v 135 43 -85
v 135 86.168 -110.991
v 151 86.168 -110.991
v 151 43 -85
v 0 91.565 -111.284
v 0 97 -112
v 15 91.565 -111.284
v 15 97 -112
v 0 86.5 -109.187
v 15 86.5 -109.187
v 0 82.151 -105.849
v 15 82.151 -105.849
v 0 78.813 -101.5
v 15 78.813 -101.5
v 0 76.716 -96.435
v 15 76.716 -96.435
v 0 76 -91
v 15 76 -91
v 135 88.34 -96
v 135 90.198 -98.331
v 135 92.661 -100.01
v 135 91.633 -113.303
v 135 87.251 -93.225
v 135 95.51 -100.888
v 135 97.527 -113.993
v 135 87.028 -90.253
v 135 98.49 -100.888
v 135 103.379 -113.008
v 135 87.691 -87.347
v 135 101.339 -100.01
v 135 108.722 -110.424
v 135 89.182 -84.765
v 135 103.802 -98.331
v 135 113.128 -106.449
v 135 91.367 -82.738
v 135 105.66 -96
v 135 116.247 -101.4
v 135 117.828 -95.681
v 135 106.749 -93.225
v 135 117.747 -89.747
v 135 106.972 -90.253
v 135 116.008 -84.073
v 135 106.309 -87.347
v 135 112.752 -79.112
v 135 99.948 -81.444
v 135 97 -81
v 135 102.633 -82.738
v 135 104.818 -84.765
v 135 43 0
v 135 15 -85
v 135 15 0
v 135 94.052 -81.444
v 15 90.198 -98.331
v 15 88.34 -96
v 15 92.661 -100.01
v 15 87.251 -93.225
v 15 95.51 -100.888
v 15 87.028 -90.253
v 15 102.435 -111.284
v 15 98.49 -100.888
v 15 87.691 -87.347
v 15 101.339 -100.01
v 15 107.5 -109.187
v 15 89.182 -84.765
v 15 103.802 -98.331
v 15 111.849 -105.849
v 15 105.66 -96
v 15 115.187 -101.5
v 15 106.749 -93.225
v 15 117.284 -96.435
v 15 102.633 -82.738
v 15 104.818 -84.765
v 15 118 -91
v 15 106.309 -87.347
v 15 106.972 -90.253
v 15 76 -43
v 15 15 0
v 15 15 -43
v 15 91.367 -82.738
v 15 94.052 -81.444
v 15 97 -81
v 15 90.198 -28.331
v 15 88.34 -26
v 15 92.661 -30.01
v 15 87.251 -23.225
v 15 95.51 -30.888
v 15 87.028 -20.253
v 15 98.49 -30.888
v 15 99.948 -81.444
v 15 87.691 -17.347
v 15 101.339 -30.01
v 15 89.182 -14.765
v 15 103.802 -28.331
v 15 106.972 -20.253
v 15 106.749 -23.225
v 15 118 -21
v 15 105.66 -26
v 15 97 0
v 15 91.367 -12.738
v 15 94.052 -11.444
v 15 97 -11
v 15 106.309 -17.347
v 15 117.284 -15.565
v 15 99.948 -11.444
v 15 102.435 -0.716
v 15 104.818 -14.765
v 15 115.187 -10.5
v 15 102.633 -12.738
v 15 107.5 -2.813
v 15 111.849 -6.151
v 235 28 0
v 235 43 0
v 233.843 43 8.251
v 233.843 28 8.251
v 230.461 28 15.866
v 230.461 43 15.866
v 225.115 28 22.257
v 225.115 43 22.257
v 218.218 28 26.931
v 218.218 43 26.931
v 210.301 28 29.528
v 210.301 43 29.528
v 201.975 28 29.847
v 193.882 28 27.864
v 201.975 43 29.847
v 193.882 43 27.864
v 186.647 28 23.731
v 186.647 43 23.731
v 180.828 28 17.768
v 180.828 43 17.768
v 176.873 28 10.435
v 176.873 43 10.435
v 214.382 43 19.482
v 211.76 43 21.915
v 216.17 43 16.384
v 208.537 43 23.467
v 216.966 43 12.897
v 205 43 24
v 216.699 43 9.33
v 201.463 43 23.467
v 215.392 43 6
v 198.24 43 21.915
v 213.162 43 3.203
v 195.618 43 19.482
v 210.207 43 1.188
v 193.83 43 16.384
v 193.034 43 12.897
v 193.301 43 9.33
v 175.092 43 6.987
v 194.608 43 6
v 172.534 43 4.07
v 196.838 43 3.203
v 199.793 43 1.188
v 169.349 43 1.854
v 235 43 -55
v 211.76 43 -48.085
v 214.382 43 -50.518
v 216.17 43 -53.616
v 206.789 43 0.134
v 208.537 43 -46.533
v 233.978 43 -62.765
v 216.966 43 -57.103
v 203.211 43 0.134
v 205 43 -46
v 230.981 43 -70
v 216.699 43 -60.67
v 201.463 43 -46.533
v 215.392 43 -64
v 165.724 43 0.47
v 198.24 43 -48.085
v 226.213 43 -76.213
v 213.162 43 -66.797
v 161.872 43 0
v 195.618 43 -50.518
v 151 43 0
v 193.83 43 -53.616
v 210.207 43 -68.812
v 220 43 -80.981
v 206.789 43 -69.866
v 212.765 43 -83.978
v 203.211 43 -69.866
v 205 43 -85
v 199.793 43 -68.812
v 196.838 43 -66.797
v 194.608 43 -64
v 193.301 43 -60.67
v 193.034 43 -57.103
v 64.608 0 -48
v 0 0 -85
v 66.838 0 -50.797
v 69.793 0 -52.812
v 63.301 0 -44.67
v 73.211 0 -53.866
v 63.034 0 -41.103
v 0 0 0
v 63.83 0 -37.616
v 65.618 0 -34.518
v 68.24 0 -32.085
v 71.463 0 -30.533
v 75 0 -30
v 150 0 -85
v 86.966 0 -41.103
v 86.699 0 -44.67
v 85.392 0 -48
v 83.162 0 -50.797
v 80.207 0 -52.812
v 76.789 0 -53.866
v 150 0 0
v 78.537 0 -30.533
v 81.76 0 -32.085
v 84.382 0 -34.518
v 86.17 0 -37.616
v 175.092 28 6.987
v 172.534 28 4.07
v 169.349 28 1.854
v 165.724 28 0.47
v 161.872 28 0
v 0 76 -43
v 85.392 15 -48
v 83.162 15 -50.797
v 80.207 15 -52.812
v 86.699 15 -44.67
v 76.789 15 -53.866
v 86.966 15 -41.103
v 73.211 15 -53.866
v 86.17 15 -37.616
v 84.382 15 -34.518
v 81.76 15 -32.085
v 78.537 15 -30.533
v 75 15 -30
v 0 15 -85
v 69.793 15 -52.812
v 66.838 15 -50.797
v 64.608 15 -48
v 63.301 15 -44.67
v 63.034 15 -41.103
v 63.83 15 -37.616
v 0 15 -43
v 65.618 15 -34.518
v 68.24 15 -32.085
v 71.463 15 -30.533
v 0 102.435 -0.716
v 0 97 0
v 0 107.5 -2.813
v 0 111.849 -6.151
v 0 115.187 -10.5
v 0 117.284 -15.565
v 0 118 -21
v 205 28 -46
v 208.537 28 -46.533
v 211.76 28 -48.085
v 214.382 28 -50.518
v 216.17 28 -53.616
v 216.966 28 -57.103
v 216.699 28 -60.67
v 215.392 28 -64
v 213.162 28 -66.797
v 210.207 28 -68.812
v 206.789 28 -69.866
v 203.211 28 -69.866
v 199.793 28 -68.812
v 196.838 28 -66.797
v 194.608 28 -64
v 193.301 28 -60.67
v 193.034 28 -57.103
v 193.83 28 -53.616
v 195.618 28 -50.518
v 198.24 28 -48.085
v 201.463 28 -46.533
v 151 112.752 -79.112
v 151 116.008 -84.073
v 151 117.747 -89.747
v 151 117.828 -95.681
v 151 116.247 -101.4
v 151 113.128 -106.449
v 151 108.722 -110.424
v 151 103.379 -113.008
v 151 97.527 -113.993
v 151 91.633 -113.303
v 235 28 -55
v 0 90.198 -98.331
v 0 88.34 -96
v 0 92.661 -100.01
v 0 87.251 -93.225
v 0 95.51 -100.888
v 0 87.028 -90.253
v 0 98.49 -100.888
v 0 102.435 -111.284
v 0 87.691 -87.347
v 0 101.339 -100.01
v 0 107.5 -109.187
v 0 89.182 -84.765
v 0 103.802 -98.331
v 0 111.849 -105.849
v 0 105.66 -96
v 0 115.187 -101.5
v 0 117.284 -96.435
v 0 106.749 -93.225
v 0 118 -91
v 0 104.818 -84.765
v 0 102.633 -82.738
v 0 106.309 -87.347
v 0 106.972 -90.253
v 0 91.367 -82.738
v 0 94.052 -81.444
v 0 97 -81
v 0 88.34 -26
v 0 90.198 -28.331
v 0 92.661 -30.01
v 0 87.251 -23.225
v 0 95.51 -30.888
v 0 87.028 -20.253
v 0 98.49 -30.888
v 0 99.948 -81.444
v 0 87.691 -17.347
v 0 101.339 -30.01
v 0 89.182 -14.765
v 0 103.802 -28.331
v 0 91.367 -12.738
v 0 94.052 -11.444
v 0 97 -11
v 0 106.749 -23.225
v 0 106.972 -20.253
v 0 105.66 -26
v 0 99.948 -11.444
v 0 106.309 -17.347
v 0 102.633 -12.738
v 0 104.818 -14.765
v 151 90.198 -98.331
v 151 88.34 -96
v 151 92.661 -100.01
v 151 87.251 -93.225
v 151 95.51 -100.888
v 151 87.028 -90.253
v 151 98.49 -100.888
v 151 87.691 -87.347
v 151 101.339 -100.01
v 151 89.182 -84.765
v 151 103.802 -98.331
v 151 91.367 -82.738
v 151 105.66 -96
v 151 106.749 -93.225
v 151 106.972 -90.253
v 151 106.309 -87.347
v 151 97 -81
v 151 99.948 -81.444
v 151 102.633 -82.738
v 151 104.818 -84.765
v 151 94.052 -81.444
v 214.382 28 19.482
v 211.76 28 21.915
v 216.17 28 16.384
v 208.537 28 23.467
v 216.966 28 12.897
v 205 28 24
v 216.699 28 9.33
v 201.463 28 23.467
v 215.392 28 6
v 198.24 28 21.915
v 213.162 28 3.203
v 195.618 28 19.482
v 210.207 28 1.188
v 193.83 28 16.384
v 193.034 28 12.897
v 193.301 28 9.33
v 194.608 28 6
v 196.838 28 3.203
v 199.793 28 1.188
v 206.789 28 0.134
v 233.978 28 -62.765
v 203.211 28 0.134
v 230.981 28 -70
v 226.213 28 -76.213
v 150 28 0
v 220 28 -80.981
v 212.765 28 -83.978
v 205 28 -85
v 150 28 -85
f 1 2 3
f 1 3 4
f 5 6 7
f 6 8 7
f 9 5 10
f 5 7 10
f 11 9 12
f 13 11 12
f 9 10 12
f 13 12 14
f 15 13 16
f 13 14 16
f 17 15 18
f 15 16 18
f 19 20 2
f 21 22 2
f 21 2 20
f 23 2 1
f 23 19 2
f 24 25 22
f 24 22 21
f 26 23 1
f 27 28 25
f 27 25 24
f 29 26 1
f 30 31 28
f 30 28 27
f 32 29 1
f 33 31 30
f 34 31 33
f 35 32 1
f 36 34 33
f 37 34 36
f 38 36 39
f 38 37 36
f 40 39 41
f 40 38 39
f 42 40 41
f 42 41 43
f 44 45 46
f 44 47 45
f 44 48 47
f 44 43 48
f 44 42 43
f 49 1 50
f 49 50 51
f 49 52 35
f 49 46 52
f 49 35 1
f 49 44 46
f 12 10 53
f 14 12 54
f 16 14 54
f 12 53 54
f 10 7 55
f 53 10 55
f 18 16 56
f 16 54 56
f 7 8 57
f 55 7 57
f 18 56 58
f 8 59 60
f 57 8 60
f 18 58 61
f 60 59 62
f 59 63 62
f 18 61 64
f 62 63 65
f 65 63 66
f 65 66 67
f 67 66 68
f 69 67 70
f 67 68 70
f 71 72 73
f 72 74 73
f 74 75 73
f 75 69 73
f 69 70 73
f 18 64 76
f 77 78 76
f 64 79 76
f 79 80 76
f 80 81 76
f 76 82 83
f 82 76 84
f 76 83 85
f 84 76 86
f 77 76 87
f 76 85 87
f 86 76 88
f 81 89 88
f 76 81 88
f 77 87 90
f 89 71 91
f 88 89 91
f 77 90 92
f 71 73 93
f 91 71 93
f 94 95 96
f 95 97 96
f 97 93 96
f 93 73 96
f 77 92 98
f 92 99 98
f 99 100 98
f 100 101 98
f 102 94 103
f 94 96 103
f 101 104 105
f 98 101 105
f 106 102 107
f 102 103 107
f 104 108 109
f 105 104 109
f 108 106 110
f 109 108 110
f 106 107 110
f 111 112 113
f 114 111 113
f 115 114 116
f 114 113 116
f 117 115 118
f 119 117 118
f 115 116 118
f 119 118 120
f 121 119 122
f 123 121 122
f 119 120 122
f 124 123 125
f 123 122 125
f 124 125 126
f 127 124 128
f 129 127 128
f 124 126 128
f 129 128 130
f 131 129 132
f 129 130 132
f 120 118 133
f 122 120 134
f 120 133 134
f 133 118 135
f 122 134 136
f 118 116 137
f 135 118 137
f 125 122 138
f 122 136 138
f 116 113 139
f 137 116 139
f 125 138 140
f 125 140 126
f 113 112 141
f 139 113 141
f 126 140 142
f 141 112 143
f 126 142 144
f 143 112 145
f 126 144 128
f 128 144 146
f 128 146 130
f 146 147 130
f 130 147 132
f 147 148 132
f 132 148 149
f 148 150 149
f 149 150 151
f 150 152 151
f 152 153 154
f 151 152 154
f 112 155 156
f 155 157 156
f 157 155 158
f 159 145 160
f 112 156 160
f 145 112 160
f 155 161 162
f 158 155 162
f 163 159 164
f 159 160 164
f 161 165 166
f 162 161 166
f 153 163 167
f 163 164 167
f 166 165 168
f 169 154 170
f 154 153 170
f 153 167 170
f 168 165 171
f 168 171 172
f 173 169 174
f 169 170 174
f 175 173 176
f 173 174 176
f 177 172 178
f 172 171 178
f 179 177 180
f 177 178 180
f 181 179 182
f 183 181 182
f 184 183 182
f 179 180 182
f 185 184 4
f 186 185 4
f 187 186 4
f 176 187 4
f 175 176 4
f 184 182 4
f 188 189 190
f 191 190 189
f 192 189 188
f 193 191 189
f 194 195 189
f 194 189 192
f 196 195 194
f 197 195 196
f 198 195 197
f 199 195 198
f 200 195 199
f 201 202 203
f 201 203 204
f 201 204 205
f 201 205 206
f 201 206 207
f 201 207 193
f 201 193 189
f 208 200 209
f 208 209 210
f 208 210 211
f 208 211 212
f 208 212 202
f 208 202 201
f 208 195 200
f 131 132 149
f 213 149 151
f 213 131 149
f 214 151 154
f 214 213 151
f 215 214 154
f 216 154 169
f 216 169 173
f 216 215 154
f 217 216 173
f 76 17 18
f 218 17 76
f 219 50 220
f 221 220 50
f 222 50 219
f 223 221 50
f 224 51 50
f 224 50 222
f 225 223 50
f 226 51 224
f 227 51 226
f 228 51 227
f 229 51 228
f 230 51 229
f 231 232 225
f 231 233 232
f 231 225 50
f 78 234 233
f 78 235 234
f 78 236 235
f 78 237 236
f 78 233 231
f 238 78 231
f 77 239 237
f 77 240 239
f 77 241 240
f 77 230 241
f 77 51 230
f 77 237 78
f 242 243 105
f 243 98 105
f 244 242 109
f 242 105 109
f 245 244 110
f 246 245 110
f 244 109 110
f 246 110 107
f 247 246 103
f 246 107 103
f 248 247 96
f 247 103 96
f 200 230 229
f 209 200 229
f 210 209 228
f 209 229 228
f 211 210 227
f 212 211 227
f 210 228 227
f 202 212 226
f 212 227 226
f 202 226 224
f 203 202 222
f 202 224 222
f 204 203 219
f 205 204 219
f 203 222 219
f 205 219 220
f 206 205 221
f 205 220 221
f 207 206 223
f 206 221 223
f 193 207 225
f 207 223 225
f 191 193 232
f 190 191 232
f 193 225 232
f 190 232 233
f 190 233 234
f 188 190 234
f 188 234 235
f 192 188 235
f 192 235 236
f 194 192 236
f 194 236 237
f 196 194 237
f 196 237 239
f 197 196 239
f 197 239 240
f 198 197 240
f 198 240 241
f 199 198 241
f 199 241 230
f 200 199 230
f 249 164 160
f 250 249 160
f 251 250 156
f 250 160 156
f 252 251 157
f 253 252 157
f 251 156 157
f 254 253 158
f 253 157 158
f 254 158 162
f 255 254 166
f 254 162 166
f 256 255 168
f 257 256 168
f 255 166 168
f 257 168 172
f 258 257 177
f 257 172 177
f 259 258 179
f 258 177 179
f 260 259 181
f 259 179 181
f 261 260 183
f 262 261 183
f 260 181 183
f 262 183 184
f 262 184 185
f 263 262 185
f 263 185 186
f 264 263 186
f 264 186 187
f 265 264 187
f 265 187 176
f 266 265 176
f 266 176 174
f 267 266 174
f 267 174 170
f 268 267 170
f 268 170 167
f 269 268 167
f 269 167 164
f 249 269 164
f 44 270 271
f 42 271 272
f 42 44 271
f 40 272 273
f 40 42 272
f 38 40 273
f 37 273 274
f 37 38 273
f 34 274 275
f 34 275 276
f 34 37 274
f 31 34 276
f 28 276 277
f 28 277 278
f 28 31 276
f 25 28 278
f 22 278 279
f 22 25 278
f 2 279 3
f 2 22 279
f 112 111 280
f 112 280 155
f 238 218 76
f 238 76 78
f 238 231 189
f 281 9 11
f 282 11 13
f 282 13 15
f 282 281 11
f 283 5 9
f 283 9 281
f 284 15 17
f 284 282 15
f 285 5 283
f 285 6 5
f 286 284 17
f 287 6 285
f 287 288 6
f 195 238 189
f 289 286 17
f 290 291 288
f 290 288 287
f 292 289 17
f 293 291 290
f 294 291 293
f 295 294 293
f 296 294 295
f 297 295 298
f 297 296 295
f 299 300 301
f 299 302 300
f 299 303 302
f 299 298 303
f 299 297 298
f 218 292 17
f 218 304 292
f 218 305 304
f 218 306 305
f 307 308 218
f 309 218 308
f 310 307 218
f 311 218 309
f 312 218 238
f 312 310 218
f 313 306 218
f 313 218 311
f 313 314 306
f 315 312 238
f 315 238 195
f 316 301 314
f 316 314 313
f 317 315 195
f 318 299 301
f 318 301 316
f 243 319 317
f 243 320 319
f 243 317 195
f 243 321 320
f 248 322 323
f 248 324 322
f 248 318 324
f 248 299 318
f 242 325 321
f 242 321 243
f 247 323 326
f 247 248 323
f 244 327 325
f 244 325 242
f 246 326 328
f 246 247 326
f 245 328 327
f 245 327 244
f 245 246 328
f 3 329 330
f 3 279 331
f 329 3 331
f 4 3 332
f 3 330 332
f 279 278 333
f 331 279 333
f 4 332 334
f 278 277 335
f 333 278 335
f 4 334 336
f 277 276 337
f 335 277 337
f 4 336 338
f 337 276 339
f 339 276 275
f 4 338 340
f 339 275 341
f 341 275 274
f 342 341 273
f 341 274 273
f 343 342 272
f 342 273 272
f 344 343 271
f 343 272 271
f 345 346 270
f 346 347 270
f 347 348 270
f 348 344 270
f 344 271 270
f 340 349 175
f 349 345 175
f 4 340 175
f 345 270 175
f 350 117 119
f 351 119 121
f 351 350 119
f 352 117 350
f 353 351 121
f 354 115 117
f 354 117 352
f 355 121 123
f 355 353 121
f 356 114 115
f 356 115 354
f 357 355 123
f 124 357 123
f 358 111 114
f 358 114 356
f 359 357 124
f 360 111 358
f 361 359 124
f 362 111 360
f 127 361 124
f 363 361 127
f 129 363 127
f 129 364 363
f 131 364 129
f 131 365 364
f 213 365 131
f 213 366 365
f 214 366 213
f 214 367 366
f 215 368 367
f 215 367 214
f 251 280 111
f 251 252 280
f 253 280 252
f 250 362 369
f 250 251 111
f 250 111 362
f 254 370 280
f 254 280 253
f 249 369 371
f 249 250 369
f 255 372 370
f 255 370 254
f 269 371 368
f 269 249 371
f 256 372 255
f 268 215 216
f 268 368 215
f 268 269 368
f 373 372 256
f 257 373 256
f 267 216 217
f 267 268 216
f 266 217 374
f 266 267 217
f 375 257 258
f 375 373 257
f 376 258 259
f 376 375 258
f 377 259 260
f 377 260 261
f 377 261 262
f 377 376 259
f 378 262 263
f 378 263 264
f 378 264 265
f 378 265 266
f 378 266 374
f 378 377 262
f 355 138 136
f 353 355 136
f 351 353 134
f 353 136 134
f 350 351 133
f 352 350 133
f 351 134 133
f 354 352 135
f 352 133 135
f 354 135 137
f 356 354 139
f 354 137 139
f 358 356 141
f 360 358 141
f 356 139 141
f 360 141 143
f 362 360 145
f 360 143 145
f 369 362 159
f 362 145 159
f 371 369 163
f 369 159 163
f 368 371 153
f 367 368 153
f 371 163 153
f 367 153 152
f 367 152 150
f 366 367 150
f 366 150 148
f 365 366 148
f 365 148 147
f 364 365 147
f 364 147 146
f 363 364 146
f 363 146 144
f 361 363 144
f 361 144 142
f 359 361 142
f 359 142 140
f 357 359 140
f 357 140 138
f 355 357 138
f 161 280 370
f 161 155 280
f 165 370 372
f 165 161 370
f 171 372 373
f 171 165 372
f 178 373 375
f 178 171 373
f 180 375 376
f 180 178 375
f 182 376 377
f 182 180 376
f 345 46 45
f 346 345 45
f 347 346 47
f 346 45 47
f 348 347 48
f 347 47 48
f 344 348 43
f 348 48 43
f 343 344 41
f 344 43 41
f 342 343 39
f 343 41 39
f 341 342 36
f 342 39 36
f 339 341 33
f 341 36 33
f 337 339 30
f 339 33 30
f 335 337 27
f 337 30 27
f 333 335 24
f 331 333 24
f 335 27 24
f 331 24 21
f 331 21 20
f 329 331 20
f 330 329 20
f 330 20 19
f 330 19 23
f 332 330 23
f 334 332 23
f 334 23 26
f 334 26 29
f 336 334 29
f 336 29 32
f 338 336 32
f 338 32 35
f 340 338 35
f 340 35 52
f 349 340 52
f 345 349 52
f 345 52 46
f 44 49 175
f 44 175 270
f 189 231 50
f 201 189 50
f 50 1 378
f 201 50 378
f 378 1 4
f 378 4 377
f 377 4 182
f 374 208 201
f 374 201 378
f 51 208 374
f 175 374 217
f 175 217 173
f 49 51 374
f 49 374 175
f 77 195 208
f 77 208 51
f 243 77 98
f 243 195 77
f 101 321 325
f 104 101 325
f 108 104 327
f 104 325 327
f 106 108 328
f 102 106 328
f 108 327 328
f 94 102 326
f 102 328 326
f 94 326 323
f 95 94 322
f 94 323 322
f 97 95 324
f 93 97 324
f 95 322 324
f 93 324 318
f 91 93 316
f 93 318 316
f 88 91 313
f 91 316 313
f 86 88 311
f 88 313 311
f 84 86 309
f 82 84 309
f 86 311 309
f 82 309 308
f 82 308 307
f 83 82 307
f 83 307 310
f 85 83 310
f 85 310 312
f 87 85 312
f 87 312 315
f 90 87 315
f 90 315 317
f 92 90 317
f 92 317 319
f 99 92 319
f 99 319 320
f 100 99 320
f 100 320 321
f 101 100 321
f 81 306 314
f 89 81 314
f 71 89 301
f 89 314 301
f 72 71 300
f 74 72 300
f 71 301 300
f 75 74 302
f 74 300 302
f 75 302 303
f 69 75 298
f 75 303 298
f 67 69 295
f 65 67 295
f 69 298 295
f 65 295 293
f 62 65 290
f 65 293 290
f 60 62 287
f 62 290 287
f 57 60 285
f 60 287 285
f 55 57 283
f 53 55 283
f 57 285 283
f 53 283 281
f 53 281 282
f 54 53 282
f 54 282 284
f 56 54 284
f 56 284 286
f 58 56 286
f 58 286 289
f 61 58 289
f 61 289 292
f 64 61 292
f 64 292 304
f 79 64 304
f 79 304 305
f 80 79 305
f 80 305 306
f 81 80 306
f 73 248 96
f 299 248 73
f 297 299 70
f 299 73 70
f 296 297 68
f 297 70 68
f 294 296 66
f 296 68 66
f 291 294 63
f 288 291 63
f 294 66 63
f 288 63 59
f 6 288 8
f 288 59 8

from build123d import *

# Parameters (mm, degrees)
EXTRUDE_THIN1_DEPTH = 85
BOSS_EXTRUDE1_DEPTH = 15
BOSS_EXTRUDE2_DEPTH = 16
FILLET1_R           = 21
BOSS_EXTRUDE3_DEPTH = 15
FILLET2_R           = 16
SKETCH6_R           = 12
CUT_EXTRUDE2_DEPTH  = 272.746205125
FILLET3_R           = 30
SKETCH7_R           = 12
CUT_EXTRUDE3_DEPTH  = 281.766807155
SKETCH9_R           = 10
CUT_EXTRUDE4_DEPTH  = 287.609490422


with BuildPart() as part:
    # Sketch1 → Extrude-Thin1 (new body)
    with BuildSketch(Plane.XY):
        Polygon((0, 0), (150, 0), (150, 28), (235, 28), (235, 43), (135, 43), (135, 15), (0, 15), align=None)
    extrude(amount=-EXTRUDE_THIN1_DEPTH)

    # Sketch2 → Boss-Extrude1 (add)
    with BuildSketch(Plane.ZY):
        Polygon((0, 15), (0, 118), (-112, 118), (-112, 76), (-43, 76), (-43, 15), align=None)
    extrude(amount=-BOSS_EXTRUDE1_DEPTH)

    # Sketch3 → Boss-Extrude2 (add)
    with BuildSketch(Plane.ZY.offset(-135)):
        with BuildLine():
            Line((0, 43), (-79.111854281, 112.751806515))
            ThreePointArc((-79.111854281, 112.751806515), (-106.449245092, 113.128168106), (-110.990788091, 86.168031394))
            Line((-110.990788091, 86.168031394), (-85, 43))
            Line((-85, 43), (0, 43))
        make_face()
    extrude(amount=-BOSS_EXTRUDE2_DEPTH)

    # Fillet1
    fillet1_edges = [part.edges().sort_by_distance(p)[0] for p in [
        (7.5, 76, -112),
        (7.5, 118, -112),
        (7.5, 118, 0),
    ]]
    fillet(fillet1_edges, radius=FILLET1_R - 0.0001)  # a hair under: the kernel refuses the full size

    # Sketch5 → Boss-Extrude3 (add)
    with BuildSketch(Plane(origin=(0, 43, 0), x_dir=(1, 0, 0), z_dir=(0, 1, 0))):
        with BuildLine():
            Line((175, 0), (235, 0))
            ThreePointArc((235, 0), (205, -30), (175, 0))
        make_face()
    extrude(amount=-BOSS_EXTRUDE3_DEPTH)

    # Fillet2
    fillet2_edges = [part.edges().sort_by_distance(p)[0] for p in [
        (175, 35.5, 0),
    ]]
    fillet(fillet2_edges, radius=FILLET2_R)

    # Sketch6 → Cut-Extrude2 (cut, through all)
    with BuildSketch(Plane(origin=(0, 43, 0), x_dir=(1, 0, 0), z_dir=(0, 1, 0))):
        with Locations(Location((205, -12, 0), (0, 0, 270))):
            Circle(SKETCH6_R)
        with Locations(Location((205, 58, 0), (0, 0, 270))):
            Circle(SKETCH6_R)
    extrude(amount=-CUT_EXTRUDE2_DEPTH, mode=Mode.SUBTRACT)

    # Fillet3
    fillet3_edges = [part.edges().sort_by_distance(p)[0] for p in [
        (235, 35.5, -85),
    ]]
    fillet(fillet3_edges, radius=FILLET3_R)

    # Sketch7 → Cut-Extrude3 (cut, through all)
    with BuildSketch(Plane(origin=(0, 15, 0), x_dir=(1, 0, 0), z_dir=(0, 1, 0))):
        with Locations(Location((75, 42, 0), (0, 0, 270))):
            Circle(SKETCH7_R)
    extrude(amount=-CUT_EXTRUDE3_DEPTH, mode=Mode.SUBTRACT)

    # Sketch9 → Cut-Extrude4 (cut, through all)
    with BuildSketch(Plane.ZY):
        with Locations((-91, 97)):
            Circle(SKETCH9_R)
        with Locations((-21, 97)):
            Circle(SKETCH9_R)
    extrude(amount=-CUT_EXTRUDE4_DEPTH, mode=Mode.SUBTRACT)


solid = part.part
